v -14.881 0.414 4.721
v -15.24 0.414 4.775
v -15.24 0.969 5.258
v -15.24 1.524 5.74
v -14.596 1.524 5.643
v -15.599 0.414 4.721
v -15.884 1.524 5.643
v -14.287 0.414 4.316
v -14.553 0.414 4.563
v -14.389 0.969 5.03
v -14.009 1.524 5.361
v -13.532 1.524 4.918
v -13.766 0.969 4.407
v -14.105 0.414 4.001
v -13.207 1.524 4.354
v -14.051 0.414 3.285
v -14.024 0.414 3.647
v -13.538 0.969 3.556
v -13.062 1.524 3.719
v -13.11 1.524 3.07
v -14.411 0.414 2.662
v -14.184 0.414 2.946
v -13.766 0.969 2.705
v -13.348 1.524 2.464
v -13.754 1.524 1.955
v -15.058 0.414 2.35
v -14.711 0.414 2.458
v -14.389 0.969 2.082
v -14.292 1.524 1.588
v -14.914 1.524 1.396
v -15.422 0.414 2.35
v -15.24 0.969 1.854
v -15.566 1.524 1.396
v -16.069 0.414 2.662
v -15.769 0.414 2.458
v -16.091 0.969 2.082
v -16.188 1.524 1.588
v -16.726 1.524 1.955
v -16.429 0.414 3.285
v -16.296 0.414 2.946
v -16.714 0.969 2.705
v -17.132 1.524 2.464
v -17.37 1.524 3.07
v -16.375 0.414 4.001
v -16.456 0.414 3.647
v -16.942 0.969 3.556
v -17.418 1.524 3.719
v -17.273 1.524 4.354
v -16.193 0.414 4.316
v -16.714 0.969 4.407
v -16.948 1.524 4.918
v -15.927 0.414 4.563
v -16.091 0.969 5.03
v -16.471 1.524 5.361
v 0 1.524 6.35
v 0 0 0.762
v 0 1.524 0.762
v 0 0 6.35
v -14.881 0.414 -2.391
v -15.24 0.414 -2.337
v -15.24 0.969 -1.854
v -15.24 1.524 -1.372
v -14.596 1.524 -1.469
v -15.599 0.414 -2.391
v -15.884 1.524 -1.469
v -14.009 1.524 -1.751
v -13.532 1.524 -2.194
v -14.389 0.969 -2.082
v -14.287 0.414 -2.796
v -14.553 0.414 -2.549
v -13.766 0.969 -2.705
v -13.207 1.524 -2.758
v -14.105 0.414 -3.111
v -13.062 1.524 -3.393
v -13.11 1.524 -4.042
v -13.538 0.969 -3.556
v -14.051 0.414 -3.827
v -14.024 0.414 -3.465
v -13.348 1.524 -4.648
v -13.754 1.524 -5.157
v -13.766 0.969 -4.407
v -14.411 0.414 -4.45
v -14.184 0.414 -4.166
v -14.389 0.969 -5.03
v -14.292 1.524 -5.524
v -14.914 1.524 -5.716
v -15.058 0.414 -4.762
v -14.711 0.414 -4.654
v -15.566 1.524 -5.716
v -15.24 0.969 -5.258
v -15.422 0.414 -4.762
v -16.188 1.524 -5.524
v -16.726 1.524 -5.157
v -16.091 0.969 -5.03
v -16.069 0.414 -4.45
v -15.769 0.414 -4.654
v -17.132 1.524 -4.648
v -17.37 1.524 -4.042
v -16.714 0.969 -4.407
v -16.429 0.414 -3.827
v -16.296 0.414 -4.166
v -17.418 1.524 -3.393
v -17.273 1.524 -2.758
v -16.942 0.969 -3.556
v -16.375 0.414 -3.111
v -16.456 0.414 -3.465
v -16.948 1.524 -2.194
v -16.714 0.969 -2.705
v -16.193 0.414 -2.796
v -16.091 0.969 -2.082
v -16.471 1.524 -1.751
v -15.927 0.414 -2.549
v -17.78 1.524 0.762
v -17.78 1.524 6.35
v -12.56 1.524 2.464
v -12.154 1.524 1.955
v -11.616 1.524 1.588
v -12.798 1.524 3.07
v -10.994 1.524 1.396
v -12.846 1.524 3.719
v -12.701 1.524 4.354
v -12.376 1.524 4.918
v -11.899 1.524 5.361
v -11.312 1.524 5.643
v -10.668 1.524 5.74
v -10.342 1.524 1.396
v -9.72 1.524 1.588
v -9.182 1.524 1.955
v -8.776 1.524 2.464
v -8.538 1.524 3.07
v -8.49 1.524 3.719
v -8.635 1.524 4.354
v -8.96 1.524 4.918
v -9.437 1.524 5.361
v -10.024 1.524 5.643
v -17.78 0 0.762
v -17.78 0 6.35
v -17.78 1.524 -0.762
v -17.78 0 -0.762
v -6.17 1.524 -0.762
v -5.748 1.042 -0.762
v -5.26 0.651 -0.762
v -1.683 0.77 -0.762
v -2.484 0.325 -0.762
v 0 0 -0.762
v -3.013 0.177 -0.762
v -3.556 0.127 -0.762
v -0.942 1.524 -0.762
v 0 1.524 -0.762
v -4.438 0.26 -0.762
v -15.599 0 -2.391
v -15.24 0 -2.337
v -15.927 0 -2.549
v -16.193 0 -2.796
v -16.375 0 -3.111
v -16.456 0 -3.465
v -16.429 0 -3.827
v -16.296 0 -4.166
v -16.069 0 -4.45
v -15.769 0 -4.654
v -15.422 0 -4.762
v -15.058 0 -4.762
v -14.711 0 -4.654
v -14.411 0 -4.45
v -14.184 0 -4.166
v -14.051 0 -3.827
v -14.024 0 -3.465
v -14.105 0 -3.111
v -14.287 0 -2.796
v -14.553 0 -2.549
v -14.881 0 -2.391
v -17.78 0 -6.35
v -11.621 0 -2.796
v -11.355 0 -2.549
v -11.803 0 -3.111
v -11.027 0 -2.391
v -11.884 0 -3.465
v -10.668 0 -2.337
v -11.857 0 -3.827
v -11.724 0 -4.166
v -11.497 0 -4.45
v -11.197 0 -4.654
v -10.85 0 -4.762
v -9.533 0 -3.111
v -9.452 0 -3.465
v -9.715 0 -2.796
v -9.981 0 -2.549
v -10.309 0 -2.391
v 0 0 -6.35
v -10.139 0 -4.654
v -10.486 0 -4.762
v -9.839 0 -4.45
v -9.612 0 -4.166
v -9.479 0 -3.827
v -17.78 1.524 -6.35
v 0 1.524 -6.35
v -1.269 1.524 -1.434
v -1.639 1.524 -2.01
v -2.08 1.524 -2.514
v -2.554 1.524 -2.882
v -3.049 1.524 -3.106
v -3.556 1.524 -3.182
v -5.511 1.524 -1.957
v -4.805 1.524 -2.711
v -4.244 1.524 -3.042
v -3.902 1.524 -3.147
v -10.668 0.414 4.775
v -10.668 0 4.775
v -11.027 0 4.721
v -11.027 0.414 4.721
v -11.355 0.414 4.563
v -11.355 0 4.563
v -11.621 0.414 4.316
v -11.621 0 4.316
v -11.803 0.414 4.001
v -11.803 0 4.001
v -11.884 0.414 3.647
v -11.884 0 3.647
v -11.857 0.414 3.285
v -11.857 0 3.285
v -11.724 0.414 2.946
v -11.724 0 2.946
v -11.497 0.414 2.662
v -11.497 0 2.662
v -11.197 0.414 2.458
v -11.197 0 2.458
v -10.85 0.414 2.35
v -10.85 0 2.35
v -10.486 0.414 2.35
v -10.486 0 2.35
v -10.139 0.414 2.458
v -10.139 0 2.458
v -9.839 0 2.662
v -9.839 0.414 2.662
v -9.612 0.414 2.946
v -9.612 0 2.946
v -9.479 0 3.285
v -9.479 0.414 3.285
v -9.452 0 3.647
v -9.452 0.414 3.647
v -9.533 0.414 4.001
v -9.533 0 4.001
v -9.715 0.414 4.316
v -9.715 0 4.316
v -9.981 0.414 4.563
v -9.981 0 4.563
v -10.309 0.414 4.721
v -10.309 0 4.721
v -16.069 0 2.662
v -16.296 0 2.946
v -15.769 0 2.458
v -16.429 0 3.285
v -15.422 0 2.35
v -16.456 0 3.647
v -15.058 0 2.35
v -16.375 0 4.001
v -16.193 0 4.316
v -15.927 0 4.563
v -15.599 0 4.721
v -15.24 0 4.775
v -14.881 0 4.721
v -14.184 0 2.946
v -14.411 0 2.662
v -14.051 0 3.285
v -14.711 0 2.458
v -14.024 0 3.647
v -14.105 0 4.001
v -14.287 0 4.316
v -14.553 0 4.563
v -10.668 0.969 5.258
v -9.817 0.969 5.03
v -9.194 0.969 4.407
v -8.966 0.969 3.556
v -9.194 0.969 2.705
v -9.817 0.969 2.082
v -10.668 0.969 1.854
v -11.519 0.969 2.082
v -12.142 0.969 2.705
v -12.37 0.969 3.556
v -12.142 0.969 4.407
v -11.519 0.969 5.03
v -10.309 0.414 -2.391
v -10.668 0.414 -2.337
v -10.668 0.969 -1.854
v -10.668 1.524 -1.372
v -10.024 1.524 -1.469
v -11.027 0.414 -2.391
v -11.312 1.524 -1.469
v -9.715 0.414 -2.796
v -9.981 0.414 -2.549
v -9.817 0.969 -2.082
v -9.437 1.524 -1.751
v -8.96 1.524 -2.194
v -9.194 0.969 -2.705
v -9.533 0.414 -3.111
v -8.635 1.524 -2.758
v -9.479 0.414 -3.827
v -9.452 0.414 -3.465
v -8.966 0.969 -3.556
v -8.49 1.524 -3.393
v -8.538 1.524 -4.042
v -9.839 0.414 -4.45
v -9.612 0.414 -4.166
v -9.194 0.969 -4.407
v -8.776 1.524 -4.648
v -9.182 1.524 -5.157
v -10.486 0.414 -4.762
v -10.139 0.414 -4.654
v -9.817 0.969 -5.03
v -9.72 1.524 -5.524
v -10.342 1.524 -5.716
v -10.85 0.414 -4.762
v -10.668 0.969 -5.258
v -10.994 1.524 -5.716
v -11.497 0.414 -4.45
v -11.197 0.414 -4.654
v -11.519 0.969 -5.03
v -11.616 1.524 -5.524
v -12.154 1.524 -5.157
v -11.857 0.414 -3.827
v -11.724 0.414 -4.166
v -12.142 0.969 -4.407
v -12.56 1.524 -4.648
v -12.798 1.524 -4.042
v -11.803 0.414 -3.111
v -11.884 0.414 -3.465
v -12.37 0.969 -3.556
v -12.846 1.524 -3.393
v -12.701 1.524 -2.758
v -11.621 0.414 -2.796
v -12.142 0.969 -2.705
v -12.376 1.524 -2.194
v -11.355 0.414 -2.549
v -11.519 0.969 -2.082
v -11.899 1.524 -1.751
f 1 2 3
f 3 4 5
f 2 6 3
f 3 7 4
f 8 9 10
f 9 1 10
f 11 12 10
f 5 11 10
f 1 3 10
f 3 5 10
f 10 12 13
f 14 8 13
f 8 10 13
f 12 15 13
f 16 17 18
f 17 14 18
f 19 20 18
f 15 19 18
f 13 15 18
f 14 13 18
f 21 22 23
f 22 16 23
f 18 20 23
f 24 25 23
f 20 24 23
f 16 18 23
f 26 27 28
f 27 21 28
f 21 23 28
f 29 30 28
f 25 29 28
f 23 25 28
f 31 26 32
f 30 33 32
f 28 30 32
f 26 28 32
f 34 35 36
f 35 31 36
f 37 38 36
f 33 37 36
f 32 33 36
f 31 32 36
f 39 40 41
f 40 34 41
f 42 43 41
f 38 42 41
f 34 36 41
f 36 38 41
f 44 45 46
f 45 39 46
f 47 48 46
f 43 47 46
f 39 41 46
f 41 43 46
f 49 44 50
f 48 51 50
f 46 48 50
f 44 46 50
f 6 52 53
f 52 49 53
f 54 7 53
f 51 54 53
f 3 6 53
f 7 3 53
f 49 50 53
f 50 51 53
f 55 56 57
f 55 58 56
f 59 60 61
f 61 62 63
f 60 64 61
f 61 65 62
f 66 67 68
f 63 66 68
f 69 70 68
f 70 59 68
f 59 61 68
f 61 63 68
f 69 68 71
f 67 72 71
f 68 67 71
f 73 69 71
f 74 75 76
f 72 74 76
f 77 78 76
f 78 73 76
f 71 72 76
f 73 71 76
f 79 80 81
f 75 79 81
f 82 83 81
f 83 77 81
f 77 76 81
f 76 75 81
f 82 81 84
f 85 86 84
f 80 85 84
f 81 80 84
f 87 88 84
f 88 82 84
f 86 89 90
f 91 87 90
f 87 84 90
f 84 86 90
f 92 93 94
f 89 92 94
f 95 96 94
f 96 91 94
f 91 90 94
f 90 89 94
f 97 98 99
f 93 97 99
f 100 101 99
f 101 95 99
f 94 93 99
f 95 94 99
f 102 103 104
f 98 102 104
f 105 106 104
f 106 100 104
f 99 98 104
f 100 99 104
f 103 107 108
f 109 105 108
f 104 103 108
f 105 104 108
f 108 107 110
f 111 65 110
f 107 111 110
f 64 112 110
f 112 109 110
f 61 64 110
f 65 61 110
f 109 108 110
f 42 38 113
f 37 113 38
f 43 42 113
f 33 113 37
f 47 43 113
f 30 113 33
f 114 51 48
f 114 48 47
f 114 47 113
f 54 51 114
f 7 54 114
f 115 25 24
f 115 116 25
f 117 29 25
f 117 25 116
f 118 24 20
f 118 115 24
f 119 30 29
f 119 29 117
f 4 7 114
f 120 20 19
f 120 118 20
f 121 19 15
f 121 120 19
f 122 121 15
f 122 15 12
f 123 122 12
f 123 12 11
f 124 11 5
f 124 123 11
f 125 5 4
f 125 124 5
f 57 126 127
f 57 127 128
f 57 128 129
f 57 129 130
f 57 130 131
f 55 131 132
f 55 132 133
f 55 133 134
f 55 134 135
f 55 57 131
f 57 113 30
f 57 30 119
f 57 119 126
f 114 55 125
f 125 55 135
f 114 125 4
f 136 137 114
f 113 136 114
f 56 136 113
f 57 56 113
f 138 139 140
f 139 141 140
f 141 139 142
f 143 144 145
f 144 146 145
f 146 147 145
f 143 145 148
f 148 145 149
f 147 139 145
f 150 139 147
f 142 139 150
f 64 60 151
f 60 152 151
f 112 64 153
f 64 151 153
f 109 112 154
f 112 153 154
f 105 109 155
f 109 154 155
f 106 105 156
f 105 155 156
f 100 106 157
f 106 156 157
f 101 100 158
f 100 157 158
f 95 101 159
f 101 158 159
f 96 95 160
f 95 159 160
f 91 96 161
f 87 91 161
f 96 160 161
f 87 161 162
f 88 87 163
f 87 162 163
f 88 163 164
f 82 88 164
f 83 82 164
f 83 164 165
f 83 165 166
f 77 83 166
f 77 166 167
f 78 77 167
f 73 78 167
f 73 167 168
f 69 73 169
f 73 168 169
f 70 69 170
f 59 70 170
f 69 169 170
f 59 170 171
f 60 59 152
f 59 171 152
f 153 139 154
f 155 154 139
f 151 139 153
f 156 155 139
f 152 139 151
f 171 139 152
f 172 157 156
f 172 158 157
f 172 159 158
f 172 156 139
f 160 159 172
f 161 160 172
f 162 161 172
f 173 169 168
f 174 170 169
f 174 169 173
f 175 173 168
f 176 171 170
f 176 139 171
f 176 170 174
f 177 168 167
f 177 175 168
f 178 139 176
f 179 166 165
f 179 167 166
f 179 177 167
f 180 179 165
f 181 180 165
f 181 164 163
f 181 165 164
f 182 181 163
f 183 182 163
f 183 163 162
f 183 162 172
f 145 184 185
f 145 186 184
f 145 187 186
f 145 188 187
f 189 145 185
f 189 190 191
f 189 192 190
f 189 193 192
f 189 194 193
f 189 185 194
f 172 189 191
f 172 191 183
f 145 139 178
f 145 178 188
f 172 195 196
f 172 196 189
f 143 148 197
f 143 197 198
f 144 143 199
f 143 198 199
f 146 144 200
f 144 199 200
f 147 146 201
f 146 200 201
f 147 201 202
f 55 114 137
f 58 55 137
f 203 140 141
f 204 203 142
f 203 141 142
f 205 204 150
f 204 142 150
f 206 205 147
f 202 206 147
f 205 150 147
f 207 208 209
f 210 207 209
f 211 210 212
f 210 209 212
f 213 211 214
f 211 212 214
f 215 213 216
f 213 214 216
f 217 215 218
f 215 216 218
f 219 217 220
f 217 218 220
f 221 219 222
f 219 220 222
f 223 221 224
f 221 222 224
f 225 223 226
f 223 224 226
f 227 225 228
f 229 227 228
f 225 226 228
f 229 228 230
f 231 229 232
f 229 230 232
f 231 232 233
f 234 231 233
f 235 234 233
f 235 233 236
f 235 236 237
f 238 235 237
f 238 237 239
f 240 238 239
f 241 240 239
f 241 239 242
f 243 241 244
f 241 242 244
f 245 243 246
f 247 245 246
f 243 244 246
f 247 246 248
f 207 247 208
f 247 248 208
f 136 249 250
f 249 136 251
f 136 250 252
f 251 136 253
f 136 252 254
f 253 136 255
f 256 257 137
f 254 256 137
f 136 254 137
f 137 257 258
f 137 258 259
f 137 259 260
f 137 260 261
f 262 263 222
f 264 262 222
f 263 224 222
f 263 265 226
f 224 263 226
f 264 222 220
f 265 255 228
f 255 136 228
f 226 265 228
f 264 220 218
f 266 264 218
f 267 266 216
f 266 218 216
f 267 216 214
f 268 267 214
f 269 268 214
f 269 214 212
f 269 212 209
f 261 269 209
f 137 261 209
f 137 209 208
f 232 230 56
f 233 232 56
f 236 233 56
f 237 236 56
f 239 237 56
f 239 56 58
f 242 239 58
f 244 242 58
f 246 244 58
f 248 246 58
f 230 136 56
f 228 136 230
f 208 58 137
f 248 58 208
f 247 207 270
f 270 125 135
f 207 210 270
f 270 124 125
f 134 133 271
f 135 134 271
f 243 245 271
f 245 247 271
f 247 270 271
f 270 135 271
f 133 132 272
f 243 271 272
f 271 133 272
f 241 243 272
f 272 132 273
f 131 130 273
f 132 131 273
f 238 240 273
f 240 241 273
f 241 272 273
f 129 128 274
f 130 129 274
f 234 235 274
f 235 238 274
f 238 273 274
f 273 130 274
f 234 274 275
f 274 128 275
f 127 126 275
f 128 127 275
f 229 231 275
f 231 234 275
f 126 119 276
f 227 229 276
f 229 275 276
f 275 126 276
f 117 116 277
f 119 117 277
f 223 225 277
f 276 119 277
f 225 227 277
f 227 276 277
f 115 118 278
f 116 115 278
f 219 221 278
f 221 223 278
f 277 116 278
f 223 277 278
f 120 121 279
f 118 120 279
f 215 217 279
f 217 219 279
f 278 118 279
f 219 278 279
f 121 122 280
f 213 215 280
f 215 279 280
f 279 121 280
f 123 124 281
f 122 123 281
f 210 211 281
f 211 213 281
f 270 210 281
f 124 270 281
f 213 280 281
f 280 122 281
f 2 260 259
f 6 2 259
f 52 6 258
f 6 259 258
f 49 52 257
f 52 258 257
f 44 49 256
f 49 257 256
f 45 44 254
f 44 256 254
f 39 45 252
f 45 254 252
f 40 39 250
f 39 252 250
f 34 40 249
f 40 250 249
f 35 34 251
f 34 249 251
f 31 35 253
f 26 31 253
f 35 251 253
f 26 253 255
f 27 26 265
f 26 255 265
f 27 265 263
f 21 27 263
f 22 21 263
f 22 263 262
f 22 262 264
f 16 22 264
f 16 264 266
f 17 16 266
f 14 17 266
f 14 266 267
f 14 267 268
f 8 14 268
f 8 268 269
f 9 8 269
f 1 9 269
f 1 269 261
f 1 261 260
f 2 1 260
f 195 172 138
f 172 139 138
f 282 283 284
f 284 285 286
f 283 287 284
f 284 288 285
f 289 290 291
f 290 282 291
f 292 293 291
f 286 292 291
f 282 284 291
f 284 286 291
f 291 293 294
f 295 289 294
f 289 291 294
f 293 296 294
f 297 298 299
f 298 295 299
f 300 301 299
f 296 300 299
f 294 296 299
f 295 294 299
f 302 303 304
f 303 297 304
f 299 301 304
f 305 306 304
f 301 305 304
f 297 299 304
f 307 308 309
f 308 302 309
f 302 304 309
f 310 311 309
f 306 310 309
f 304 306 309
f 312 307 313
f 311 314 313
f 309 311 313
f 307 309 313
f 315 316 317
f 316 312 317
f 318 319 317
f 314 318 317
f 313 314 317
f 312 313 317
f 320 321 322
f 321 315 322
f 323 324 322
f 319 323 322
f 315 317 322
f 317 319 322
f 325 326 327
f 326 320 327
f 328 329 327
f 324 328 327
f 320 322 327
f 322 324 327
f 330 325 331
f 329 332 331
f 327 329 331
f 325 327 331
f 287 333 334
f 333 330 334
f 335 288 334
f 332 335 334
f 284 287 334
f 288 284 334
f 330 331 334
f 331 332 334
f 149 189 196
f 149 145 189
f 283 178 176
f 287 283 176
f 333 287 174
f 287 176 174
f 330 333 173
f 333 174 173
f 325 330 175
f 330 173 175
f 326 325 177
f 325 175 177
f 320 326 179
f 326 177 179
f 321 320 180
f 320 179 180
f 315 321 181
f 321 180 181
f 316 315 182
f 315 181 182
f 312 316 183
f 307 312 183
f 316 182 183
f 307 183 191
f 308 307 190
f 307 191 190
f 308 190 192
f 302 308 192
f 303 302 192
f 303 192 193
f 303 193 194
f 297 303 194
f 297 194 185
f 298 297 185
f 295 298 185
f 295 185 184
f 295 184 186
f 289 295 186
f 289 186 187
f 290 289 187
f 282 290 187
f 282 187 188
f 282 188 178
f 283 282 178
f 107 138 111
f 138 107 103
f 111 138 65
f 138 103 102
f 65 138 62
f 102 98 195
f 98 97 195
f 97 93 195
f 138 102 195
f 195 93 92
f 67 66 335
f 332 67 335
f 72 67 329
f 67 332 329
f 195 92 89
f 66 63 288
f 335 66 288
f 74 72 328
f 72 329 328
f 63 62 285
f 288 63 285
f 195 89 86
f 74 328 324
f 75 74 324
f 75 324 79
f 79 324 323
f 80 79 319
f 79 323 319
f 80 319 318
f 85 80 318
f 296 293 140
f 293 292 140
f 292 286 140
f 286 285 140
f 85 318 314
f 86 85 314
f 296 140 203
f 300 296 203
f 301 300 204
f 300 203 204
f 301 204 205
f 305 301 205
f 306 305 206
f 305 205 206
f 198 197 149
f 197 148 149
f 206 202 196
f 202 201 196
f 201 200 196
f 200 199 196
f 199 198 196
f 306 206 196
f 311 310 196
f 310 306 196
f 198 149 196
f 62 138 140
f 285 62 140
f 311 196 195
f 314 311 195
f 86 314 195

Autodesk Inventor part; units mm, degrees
ref_plane "YZ Plane" through (0, 0, 0) normal (1, 0, 0) x (0, 1, 0)
ref_plane "XZ Plane" through (0, 0, 0) normal (0, 1, 0) x (-1, 0, 0)
sketch "Sketch1" plane through (0, 0, 0) normal (1, 0, 0) x (0, 1, 0)
  line L0 (-1.3056, 0) -> (7.8339, 0) construction
  line L1 (0, -10.9768) -> (0, 10.9768) construction
  line L2 (0, -0.762) -> (0, -6.35)
  line L3 (0, -0.762) -> (0.127, -0.762)
  line L4 (0.127, -0.762) -> (1.524, -3.1817)
  line L5 (1.524, -3.1817) -> (1.524, -6.35)
  line L6 (1.524, -6.35) -> (0, -6.35)
  circle A0 centre (3.3532, 0) radius 3.175 construction
  line L7 (2.5595, 7.8406) -> (4.147, 7.8406) construction
  line L8 (4.147, 7.8406) -> (4.147, -7.8406) construction
  line L9 (4.147, -7.8406) -> (2.5595, -7.8406) construction
  line L10 (2.5595, -7.8406) -> (2.5595, 7.8406) construction
  line L11 (2.5595, 7.8406) -> (4.147, -7.8406) construction
  line L12 (4.147, 7.8406) -> (2.5595, -7.8406) construction
  line L13 (0, 0.762) -> (0, 6.35)
  line L14 (0, 0.762) -> (0.127, 0.762)
  line L15 (0.127, 0.762) -> (1.524, 3.1817)
  line L16 (1.524, 3.1817) -> (1.524, 6.35)
  line L17 (1.524, 6.35) -> (0, 6.35)
  point P0 (0, 0)
  point P1 (2.38, -3.0222)
  point P2 (2.38, 3.0222)
  dimension "d12" = 30
  dimension "d13" = 0.127
  dimension "bearing_thickness" = 1.524
  dimension "d15" = 0.762
  dimension "d17" = 6.35
  dimension "d18" = 1.5875
  dimension "d23" = 12.7
  dimension "d52" = 3.3532
extrude "Extrusion1" add sketch "Sketch1" against normal blind 17.78
sketch "Sketch2" plane through (0, 1.524, -3.1817) normal (0, 1, 0) x (1, 0, 0)
  circle A0 centre (-3.556, -3.1817) radius 3.175 construction
  line L0 (-21.336, -3.1817) -> (3.556, -3.1817) projected
  point P0 (0, -3.1817)
  dimension "d21" = 6.35
  dimension "d22" = 3.556
sketch "Sketch3" plane through (-17.78, 0, 0) normal (-1, 0, 0) x (0, 0, 1)
  line L0 (0.762, 0.127) -> (0.762, 0) projected
  line L1 (0.762, 0) -> (6.35, 0) projected
  line L2 (6.35, 0) -> (6.35, 1.524) projected
  line L3 (6.35, 1.524) -> (3.1817, 1.524) projected
  line L4 (3.1817, 1.524) -> (0.762, 0.127) projected
  line L5 (0.762, 0) -> (6.35, 0) projected
  line L6 (6.35, 1.524) -> (0.762, 1.524)
  line L7 (0.762, 1.524) -> (0.762, 0)
  line L8 (0.762, 0) -> (6.35, 0)
  line L9 (6.35, 0) -> (6.35, 1.524)
  line L10 (0, -2.7581) -> (0, 4.2598) construction
  line L11 (-0.762, 0) -> (-6.35, 0)
  line L12 (-6.35, 0) -> (-6.35, 1.524)
  line L13 (-6.35, 1.524) -> (-0.762, 1.524)
  line L14 (-0.762, 1.524) -> (-0.762, 0)
  point P0 (0, 0)
extrude "Extrusion2" add sketch "Sketch3" against normal blind 14.224
sketch "Sketch4" plane through (-3.556, 0, 0) normal (1, 0, 0) x (0, 0, -1)
  line L0 (-3.1817, 1.524) -> (-0.762, 0.127) projected
  line L1 (3.1817, 1.524) -> (0.762, 0.127) projected
  line L2 (-0.762, 0.127) -> (-0.762, 0) projected
  line L3 (-0.762, 0.127) -> (0.762, 0.127)
  line L4 (0, -1.3056) -> (0, 7.8339) construction
  line L5 (-0.762, 1.524) -> (-3.1817, 1.524) projected
  line L6 (-3.1817, 1.524) -> (3.1817, 1.524)
  line L7 (0, 1.524) -> (0, -0.3129)
  line L8 (-0.762, 0.127) -> (0, -0.3129)
  line L9 (0.762, 0.127) -> (0, -0.3129)
  line L10 (0.762, 0) -> (6.35, 0) projected
  point P0 (0, 0)
  point P1 (0, 0.127)
  dimension "d45" = 0.3129
revolve "Revolution1" [suppressed]
sketch "Sketch5" plane through (0, 1.524, -3.1817) normal (0, 1, 0) x (1, 0, 0)
  line L0 (-17.78, -2.4197) -> (-3.556, -2.4197) construction
  line L1 (-17.78, -2.4197) -> (-17.78, 3.1683) construction
  line L2 (0, 3.1683) -> (-17.78, 3.1683) construction
  line L3 (-21.336, -3.1817) -> (3.556, -3.1817) construction
  line L4 (-3.556, -3.1817) -> (-3.556, 6.3173) construction
  point P0 (0, -3.1817)
  point P1 (-10.668, 0.3743)
  point P2 (-15.24, -6.7377)
  point P3 (-10.668, -6.7377)
  point P4 (-15.24, 0.3743)
  dimension "hole1_setback" = 7.112
  dimension "hole_lateral" = 3.556
  dimension "hole2_setback" = 11.684
hole "Hole1" at (-10.668, 1.524, -3.556) at (-15.24, 1.524, 3.556) at (-10.668, 1.524, 3.556) at (-15.24, 1.524, -3.556) direction (0, -1, 0) diameter 2.4384 depth 25.4 tip angle 118 countersink diameter 4.3688 countersink angle 82 clearance for "Flat Head Machine Screw (82)" size "#2" standard "Ansi Unified Screw Threads"
ref_plane "Work Plane1" through (0, 3.3532, 0) normal (0, 1, 0) x (-1, 0, 0)
sketch "Sketch7" plane through (-3.556, 0, 0) normal (1, 0, 0) x (0, 0, -1)
  line L0 (3.1817, 1.524) -> (0.762, 0.127) projected
  line L1 (0.542, 0) -> (4.5015, 2.286)
  line L2 (4.5015, 2.286) -> (0.542, 0)
  line L3 (-1.1725, 2.9696) -> (0.542, 0)
  line L4 (4.5015, 2.286) -> (2.787, 5.2556)
  line L5 (2.787, 5.2556) -> (-1.1725, 2.9696)
  line L6 (10.9768, 0) -> (-10.9768, 0) construction
  point P0 (0, 0)
  dimension "d46" = 3.429
  dimension "d47" = 4.572
revolve "Revolution3" cut sketch "Sketch7" angle 360 about axis through (-3.556, 5.2556, -2.787) along (0, -0.5, 0.8660254)
sketch "Sketch8" plane through (0, 0, 0) normal (1, 0, 0) x (0, 0, -1)
  line L0 (-0.762, 0.127) -> (-0.762, 0) projected
  line L1 (-6.35, 1.524) -> (-0.762, 1.524) projected
  line L2 (-0.762, 0) -> (-6.35, 0)
  line L3 (-6.35, 0) -> (-6.35, 1.524)
  line L4 (-6.35, 1.524) -> (-0.762, 1.524)
  line L5 (-0.762, 1.524) -> (-0.762, 0)
  line L6 (6.35, 0) -> (0.762, 0) projected
  line L7 (6.35, 1.524) -> (6.35, 0) projected
  line L8 (0.762, 0) -> (6.35, 0)
  line L9 (6.35, 0) -> (6.35, 1.524)
  line L10 (6.35, 1.524) -> (0.762, 1.524)
  line L11 (0.762, 1.524) -> (0.762, 0)
  point P0 (0, 0)
extrude "Extrusion3" add sketch "Sketch8" against normal blind 3.556
sketch "Sketch9" plane through (-3.556, 0, 0) normal (-1, 0, 0) x (0, 0, 1)
  line L0 (-0.542, 0) -> (-4.5015, 2.286) projected
  line L1 (-4.5015, 2.286) -> (-2.787, 5.2556) projected
  line L2 (-2.787, 5.2556) -> (1.1725, 2.9696) projected
  line L3 (1.1725, 2.9696) -> (-0.542, 0) projected
  point P0 (0, 0)
revolve "Revolution4" cut sketch "Sketch9" angle 360 about axis through (-3.556, 5.2556, -2.787) along (0, -0.5, 0.8660254)
sketch "Sketch6" plane through (0, 3.3532, 0) normal (0, 1, 0) x (-1, 0, 0)
  circle A0 centre (3.556, 0) radius 3.175 construction
  circle A1 centre (3.556, 0) radius 3.175
  line L0 (8.0772, 0) -> (-1.3462, 0) projected
  line L1 (0.381, 0) -> (6.731, 0)
  point P0 (0, 0)
revolve "Revolution2" [suppressed]
properties part number "bearing_insert"
